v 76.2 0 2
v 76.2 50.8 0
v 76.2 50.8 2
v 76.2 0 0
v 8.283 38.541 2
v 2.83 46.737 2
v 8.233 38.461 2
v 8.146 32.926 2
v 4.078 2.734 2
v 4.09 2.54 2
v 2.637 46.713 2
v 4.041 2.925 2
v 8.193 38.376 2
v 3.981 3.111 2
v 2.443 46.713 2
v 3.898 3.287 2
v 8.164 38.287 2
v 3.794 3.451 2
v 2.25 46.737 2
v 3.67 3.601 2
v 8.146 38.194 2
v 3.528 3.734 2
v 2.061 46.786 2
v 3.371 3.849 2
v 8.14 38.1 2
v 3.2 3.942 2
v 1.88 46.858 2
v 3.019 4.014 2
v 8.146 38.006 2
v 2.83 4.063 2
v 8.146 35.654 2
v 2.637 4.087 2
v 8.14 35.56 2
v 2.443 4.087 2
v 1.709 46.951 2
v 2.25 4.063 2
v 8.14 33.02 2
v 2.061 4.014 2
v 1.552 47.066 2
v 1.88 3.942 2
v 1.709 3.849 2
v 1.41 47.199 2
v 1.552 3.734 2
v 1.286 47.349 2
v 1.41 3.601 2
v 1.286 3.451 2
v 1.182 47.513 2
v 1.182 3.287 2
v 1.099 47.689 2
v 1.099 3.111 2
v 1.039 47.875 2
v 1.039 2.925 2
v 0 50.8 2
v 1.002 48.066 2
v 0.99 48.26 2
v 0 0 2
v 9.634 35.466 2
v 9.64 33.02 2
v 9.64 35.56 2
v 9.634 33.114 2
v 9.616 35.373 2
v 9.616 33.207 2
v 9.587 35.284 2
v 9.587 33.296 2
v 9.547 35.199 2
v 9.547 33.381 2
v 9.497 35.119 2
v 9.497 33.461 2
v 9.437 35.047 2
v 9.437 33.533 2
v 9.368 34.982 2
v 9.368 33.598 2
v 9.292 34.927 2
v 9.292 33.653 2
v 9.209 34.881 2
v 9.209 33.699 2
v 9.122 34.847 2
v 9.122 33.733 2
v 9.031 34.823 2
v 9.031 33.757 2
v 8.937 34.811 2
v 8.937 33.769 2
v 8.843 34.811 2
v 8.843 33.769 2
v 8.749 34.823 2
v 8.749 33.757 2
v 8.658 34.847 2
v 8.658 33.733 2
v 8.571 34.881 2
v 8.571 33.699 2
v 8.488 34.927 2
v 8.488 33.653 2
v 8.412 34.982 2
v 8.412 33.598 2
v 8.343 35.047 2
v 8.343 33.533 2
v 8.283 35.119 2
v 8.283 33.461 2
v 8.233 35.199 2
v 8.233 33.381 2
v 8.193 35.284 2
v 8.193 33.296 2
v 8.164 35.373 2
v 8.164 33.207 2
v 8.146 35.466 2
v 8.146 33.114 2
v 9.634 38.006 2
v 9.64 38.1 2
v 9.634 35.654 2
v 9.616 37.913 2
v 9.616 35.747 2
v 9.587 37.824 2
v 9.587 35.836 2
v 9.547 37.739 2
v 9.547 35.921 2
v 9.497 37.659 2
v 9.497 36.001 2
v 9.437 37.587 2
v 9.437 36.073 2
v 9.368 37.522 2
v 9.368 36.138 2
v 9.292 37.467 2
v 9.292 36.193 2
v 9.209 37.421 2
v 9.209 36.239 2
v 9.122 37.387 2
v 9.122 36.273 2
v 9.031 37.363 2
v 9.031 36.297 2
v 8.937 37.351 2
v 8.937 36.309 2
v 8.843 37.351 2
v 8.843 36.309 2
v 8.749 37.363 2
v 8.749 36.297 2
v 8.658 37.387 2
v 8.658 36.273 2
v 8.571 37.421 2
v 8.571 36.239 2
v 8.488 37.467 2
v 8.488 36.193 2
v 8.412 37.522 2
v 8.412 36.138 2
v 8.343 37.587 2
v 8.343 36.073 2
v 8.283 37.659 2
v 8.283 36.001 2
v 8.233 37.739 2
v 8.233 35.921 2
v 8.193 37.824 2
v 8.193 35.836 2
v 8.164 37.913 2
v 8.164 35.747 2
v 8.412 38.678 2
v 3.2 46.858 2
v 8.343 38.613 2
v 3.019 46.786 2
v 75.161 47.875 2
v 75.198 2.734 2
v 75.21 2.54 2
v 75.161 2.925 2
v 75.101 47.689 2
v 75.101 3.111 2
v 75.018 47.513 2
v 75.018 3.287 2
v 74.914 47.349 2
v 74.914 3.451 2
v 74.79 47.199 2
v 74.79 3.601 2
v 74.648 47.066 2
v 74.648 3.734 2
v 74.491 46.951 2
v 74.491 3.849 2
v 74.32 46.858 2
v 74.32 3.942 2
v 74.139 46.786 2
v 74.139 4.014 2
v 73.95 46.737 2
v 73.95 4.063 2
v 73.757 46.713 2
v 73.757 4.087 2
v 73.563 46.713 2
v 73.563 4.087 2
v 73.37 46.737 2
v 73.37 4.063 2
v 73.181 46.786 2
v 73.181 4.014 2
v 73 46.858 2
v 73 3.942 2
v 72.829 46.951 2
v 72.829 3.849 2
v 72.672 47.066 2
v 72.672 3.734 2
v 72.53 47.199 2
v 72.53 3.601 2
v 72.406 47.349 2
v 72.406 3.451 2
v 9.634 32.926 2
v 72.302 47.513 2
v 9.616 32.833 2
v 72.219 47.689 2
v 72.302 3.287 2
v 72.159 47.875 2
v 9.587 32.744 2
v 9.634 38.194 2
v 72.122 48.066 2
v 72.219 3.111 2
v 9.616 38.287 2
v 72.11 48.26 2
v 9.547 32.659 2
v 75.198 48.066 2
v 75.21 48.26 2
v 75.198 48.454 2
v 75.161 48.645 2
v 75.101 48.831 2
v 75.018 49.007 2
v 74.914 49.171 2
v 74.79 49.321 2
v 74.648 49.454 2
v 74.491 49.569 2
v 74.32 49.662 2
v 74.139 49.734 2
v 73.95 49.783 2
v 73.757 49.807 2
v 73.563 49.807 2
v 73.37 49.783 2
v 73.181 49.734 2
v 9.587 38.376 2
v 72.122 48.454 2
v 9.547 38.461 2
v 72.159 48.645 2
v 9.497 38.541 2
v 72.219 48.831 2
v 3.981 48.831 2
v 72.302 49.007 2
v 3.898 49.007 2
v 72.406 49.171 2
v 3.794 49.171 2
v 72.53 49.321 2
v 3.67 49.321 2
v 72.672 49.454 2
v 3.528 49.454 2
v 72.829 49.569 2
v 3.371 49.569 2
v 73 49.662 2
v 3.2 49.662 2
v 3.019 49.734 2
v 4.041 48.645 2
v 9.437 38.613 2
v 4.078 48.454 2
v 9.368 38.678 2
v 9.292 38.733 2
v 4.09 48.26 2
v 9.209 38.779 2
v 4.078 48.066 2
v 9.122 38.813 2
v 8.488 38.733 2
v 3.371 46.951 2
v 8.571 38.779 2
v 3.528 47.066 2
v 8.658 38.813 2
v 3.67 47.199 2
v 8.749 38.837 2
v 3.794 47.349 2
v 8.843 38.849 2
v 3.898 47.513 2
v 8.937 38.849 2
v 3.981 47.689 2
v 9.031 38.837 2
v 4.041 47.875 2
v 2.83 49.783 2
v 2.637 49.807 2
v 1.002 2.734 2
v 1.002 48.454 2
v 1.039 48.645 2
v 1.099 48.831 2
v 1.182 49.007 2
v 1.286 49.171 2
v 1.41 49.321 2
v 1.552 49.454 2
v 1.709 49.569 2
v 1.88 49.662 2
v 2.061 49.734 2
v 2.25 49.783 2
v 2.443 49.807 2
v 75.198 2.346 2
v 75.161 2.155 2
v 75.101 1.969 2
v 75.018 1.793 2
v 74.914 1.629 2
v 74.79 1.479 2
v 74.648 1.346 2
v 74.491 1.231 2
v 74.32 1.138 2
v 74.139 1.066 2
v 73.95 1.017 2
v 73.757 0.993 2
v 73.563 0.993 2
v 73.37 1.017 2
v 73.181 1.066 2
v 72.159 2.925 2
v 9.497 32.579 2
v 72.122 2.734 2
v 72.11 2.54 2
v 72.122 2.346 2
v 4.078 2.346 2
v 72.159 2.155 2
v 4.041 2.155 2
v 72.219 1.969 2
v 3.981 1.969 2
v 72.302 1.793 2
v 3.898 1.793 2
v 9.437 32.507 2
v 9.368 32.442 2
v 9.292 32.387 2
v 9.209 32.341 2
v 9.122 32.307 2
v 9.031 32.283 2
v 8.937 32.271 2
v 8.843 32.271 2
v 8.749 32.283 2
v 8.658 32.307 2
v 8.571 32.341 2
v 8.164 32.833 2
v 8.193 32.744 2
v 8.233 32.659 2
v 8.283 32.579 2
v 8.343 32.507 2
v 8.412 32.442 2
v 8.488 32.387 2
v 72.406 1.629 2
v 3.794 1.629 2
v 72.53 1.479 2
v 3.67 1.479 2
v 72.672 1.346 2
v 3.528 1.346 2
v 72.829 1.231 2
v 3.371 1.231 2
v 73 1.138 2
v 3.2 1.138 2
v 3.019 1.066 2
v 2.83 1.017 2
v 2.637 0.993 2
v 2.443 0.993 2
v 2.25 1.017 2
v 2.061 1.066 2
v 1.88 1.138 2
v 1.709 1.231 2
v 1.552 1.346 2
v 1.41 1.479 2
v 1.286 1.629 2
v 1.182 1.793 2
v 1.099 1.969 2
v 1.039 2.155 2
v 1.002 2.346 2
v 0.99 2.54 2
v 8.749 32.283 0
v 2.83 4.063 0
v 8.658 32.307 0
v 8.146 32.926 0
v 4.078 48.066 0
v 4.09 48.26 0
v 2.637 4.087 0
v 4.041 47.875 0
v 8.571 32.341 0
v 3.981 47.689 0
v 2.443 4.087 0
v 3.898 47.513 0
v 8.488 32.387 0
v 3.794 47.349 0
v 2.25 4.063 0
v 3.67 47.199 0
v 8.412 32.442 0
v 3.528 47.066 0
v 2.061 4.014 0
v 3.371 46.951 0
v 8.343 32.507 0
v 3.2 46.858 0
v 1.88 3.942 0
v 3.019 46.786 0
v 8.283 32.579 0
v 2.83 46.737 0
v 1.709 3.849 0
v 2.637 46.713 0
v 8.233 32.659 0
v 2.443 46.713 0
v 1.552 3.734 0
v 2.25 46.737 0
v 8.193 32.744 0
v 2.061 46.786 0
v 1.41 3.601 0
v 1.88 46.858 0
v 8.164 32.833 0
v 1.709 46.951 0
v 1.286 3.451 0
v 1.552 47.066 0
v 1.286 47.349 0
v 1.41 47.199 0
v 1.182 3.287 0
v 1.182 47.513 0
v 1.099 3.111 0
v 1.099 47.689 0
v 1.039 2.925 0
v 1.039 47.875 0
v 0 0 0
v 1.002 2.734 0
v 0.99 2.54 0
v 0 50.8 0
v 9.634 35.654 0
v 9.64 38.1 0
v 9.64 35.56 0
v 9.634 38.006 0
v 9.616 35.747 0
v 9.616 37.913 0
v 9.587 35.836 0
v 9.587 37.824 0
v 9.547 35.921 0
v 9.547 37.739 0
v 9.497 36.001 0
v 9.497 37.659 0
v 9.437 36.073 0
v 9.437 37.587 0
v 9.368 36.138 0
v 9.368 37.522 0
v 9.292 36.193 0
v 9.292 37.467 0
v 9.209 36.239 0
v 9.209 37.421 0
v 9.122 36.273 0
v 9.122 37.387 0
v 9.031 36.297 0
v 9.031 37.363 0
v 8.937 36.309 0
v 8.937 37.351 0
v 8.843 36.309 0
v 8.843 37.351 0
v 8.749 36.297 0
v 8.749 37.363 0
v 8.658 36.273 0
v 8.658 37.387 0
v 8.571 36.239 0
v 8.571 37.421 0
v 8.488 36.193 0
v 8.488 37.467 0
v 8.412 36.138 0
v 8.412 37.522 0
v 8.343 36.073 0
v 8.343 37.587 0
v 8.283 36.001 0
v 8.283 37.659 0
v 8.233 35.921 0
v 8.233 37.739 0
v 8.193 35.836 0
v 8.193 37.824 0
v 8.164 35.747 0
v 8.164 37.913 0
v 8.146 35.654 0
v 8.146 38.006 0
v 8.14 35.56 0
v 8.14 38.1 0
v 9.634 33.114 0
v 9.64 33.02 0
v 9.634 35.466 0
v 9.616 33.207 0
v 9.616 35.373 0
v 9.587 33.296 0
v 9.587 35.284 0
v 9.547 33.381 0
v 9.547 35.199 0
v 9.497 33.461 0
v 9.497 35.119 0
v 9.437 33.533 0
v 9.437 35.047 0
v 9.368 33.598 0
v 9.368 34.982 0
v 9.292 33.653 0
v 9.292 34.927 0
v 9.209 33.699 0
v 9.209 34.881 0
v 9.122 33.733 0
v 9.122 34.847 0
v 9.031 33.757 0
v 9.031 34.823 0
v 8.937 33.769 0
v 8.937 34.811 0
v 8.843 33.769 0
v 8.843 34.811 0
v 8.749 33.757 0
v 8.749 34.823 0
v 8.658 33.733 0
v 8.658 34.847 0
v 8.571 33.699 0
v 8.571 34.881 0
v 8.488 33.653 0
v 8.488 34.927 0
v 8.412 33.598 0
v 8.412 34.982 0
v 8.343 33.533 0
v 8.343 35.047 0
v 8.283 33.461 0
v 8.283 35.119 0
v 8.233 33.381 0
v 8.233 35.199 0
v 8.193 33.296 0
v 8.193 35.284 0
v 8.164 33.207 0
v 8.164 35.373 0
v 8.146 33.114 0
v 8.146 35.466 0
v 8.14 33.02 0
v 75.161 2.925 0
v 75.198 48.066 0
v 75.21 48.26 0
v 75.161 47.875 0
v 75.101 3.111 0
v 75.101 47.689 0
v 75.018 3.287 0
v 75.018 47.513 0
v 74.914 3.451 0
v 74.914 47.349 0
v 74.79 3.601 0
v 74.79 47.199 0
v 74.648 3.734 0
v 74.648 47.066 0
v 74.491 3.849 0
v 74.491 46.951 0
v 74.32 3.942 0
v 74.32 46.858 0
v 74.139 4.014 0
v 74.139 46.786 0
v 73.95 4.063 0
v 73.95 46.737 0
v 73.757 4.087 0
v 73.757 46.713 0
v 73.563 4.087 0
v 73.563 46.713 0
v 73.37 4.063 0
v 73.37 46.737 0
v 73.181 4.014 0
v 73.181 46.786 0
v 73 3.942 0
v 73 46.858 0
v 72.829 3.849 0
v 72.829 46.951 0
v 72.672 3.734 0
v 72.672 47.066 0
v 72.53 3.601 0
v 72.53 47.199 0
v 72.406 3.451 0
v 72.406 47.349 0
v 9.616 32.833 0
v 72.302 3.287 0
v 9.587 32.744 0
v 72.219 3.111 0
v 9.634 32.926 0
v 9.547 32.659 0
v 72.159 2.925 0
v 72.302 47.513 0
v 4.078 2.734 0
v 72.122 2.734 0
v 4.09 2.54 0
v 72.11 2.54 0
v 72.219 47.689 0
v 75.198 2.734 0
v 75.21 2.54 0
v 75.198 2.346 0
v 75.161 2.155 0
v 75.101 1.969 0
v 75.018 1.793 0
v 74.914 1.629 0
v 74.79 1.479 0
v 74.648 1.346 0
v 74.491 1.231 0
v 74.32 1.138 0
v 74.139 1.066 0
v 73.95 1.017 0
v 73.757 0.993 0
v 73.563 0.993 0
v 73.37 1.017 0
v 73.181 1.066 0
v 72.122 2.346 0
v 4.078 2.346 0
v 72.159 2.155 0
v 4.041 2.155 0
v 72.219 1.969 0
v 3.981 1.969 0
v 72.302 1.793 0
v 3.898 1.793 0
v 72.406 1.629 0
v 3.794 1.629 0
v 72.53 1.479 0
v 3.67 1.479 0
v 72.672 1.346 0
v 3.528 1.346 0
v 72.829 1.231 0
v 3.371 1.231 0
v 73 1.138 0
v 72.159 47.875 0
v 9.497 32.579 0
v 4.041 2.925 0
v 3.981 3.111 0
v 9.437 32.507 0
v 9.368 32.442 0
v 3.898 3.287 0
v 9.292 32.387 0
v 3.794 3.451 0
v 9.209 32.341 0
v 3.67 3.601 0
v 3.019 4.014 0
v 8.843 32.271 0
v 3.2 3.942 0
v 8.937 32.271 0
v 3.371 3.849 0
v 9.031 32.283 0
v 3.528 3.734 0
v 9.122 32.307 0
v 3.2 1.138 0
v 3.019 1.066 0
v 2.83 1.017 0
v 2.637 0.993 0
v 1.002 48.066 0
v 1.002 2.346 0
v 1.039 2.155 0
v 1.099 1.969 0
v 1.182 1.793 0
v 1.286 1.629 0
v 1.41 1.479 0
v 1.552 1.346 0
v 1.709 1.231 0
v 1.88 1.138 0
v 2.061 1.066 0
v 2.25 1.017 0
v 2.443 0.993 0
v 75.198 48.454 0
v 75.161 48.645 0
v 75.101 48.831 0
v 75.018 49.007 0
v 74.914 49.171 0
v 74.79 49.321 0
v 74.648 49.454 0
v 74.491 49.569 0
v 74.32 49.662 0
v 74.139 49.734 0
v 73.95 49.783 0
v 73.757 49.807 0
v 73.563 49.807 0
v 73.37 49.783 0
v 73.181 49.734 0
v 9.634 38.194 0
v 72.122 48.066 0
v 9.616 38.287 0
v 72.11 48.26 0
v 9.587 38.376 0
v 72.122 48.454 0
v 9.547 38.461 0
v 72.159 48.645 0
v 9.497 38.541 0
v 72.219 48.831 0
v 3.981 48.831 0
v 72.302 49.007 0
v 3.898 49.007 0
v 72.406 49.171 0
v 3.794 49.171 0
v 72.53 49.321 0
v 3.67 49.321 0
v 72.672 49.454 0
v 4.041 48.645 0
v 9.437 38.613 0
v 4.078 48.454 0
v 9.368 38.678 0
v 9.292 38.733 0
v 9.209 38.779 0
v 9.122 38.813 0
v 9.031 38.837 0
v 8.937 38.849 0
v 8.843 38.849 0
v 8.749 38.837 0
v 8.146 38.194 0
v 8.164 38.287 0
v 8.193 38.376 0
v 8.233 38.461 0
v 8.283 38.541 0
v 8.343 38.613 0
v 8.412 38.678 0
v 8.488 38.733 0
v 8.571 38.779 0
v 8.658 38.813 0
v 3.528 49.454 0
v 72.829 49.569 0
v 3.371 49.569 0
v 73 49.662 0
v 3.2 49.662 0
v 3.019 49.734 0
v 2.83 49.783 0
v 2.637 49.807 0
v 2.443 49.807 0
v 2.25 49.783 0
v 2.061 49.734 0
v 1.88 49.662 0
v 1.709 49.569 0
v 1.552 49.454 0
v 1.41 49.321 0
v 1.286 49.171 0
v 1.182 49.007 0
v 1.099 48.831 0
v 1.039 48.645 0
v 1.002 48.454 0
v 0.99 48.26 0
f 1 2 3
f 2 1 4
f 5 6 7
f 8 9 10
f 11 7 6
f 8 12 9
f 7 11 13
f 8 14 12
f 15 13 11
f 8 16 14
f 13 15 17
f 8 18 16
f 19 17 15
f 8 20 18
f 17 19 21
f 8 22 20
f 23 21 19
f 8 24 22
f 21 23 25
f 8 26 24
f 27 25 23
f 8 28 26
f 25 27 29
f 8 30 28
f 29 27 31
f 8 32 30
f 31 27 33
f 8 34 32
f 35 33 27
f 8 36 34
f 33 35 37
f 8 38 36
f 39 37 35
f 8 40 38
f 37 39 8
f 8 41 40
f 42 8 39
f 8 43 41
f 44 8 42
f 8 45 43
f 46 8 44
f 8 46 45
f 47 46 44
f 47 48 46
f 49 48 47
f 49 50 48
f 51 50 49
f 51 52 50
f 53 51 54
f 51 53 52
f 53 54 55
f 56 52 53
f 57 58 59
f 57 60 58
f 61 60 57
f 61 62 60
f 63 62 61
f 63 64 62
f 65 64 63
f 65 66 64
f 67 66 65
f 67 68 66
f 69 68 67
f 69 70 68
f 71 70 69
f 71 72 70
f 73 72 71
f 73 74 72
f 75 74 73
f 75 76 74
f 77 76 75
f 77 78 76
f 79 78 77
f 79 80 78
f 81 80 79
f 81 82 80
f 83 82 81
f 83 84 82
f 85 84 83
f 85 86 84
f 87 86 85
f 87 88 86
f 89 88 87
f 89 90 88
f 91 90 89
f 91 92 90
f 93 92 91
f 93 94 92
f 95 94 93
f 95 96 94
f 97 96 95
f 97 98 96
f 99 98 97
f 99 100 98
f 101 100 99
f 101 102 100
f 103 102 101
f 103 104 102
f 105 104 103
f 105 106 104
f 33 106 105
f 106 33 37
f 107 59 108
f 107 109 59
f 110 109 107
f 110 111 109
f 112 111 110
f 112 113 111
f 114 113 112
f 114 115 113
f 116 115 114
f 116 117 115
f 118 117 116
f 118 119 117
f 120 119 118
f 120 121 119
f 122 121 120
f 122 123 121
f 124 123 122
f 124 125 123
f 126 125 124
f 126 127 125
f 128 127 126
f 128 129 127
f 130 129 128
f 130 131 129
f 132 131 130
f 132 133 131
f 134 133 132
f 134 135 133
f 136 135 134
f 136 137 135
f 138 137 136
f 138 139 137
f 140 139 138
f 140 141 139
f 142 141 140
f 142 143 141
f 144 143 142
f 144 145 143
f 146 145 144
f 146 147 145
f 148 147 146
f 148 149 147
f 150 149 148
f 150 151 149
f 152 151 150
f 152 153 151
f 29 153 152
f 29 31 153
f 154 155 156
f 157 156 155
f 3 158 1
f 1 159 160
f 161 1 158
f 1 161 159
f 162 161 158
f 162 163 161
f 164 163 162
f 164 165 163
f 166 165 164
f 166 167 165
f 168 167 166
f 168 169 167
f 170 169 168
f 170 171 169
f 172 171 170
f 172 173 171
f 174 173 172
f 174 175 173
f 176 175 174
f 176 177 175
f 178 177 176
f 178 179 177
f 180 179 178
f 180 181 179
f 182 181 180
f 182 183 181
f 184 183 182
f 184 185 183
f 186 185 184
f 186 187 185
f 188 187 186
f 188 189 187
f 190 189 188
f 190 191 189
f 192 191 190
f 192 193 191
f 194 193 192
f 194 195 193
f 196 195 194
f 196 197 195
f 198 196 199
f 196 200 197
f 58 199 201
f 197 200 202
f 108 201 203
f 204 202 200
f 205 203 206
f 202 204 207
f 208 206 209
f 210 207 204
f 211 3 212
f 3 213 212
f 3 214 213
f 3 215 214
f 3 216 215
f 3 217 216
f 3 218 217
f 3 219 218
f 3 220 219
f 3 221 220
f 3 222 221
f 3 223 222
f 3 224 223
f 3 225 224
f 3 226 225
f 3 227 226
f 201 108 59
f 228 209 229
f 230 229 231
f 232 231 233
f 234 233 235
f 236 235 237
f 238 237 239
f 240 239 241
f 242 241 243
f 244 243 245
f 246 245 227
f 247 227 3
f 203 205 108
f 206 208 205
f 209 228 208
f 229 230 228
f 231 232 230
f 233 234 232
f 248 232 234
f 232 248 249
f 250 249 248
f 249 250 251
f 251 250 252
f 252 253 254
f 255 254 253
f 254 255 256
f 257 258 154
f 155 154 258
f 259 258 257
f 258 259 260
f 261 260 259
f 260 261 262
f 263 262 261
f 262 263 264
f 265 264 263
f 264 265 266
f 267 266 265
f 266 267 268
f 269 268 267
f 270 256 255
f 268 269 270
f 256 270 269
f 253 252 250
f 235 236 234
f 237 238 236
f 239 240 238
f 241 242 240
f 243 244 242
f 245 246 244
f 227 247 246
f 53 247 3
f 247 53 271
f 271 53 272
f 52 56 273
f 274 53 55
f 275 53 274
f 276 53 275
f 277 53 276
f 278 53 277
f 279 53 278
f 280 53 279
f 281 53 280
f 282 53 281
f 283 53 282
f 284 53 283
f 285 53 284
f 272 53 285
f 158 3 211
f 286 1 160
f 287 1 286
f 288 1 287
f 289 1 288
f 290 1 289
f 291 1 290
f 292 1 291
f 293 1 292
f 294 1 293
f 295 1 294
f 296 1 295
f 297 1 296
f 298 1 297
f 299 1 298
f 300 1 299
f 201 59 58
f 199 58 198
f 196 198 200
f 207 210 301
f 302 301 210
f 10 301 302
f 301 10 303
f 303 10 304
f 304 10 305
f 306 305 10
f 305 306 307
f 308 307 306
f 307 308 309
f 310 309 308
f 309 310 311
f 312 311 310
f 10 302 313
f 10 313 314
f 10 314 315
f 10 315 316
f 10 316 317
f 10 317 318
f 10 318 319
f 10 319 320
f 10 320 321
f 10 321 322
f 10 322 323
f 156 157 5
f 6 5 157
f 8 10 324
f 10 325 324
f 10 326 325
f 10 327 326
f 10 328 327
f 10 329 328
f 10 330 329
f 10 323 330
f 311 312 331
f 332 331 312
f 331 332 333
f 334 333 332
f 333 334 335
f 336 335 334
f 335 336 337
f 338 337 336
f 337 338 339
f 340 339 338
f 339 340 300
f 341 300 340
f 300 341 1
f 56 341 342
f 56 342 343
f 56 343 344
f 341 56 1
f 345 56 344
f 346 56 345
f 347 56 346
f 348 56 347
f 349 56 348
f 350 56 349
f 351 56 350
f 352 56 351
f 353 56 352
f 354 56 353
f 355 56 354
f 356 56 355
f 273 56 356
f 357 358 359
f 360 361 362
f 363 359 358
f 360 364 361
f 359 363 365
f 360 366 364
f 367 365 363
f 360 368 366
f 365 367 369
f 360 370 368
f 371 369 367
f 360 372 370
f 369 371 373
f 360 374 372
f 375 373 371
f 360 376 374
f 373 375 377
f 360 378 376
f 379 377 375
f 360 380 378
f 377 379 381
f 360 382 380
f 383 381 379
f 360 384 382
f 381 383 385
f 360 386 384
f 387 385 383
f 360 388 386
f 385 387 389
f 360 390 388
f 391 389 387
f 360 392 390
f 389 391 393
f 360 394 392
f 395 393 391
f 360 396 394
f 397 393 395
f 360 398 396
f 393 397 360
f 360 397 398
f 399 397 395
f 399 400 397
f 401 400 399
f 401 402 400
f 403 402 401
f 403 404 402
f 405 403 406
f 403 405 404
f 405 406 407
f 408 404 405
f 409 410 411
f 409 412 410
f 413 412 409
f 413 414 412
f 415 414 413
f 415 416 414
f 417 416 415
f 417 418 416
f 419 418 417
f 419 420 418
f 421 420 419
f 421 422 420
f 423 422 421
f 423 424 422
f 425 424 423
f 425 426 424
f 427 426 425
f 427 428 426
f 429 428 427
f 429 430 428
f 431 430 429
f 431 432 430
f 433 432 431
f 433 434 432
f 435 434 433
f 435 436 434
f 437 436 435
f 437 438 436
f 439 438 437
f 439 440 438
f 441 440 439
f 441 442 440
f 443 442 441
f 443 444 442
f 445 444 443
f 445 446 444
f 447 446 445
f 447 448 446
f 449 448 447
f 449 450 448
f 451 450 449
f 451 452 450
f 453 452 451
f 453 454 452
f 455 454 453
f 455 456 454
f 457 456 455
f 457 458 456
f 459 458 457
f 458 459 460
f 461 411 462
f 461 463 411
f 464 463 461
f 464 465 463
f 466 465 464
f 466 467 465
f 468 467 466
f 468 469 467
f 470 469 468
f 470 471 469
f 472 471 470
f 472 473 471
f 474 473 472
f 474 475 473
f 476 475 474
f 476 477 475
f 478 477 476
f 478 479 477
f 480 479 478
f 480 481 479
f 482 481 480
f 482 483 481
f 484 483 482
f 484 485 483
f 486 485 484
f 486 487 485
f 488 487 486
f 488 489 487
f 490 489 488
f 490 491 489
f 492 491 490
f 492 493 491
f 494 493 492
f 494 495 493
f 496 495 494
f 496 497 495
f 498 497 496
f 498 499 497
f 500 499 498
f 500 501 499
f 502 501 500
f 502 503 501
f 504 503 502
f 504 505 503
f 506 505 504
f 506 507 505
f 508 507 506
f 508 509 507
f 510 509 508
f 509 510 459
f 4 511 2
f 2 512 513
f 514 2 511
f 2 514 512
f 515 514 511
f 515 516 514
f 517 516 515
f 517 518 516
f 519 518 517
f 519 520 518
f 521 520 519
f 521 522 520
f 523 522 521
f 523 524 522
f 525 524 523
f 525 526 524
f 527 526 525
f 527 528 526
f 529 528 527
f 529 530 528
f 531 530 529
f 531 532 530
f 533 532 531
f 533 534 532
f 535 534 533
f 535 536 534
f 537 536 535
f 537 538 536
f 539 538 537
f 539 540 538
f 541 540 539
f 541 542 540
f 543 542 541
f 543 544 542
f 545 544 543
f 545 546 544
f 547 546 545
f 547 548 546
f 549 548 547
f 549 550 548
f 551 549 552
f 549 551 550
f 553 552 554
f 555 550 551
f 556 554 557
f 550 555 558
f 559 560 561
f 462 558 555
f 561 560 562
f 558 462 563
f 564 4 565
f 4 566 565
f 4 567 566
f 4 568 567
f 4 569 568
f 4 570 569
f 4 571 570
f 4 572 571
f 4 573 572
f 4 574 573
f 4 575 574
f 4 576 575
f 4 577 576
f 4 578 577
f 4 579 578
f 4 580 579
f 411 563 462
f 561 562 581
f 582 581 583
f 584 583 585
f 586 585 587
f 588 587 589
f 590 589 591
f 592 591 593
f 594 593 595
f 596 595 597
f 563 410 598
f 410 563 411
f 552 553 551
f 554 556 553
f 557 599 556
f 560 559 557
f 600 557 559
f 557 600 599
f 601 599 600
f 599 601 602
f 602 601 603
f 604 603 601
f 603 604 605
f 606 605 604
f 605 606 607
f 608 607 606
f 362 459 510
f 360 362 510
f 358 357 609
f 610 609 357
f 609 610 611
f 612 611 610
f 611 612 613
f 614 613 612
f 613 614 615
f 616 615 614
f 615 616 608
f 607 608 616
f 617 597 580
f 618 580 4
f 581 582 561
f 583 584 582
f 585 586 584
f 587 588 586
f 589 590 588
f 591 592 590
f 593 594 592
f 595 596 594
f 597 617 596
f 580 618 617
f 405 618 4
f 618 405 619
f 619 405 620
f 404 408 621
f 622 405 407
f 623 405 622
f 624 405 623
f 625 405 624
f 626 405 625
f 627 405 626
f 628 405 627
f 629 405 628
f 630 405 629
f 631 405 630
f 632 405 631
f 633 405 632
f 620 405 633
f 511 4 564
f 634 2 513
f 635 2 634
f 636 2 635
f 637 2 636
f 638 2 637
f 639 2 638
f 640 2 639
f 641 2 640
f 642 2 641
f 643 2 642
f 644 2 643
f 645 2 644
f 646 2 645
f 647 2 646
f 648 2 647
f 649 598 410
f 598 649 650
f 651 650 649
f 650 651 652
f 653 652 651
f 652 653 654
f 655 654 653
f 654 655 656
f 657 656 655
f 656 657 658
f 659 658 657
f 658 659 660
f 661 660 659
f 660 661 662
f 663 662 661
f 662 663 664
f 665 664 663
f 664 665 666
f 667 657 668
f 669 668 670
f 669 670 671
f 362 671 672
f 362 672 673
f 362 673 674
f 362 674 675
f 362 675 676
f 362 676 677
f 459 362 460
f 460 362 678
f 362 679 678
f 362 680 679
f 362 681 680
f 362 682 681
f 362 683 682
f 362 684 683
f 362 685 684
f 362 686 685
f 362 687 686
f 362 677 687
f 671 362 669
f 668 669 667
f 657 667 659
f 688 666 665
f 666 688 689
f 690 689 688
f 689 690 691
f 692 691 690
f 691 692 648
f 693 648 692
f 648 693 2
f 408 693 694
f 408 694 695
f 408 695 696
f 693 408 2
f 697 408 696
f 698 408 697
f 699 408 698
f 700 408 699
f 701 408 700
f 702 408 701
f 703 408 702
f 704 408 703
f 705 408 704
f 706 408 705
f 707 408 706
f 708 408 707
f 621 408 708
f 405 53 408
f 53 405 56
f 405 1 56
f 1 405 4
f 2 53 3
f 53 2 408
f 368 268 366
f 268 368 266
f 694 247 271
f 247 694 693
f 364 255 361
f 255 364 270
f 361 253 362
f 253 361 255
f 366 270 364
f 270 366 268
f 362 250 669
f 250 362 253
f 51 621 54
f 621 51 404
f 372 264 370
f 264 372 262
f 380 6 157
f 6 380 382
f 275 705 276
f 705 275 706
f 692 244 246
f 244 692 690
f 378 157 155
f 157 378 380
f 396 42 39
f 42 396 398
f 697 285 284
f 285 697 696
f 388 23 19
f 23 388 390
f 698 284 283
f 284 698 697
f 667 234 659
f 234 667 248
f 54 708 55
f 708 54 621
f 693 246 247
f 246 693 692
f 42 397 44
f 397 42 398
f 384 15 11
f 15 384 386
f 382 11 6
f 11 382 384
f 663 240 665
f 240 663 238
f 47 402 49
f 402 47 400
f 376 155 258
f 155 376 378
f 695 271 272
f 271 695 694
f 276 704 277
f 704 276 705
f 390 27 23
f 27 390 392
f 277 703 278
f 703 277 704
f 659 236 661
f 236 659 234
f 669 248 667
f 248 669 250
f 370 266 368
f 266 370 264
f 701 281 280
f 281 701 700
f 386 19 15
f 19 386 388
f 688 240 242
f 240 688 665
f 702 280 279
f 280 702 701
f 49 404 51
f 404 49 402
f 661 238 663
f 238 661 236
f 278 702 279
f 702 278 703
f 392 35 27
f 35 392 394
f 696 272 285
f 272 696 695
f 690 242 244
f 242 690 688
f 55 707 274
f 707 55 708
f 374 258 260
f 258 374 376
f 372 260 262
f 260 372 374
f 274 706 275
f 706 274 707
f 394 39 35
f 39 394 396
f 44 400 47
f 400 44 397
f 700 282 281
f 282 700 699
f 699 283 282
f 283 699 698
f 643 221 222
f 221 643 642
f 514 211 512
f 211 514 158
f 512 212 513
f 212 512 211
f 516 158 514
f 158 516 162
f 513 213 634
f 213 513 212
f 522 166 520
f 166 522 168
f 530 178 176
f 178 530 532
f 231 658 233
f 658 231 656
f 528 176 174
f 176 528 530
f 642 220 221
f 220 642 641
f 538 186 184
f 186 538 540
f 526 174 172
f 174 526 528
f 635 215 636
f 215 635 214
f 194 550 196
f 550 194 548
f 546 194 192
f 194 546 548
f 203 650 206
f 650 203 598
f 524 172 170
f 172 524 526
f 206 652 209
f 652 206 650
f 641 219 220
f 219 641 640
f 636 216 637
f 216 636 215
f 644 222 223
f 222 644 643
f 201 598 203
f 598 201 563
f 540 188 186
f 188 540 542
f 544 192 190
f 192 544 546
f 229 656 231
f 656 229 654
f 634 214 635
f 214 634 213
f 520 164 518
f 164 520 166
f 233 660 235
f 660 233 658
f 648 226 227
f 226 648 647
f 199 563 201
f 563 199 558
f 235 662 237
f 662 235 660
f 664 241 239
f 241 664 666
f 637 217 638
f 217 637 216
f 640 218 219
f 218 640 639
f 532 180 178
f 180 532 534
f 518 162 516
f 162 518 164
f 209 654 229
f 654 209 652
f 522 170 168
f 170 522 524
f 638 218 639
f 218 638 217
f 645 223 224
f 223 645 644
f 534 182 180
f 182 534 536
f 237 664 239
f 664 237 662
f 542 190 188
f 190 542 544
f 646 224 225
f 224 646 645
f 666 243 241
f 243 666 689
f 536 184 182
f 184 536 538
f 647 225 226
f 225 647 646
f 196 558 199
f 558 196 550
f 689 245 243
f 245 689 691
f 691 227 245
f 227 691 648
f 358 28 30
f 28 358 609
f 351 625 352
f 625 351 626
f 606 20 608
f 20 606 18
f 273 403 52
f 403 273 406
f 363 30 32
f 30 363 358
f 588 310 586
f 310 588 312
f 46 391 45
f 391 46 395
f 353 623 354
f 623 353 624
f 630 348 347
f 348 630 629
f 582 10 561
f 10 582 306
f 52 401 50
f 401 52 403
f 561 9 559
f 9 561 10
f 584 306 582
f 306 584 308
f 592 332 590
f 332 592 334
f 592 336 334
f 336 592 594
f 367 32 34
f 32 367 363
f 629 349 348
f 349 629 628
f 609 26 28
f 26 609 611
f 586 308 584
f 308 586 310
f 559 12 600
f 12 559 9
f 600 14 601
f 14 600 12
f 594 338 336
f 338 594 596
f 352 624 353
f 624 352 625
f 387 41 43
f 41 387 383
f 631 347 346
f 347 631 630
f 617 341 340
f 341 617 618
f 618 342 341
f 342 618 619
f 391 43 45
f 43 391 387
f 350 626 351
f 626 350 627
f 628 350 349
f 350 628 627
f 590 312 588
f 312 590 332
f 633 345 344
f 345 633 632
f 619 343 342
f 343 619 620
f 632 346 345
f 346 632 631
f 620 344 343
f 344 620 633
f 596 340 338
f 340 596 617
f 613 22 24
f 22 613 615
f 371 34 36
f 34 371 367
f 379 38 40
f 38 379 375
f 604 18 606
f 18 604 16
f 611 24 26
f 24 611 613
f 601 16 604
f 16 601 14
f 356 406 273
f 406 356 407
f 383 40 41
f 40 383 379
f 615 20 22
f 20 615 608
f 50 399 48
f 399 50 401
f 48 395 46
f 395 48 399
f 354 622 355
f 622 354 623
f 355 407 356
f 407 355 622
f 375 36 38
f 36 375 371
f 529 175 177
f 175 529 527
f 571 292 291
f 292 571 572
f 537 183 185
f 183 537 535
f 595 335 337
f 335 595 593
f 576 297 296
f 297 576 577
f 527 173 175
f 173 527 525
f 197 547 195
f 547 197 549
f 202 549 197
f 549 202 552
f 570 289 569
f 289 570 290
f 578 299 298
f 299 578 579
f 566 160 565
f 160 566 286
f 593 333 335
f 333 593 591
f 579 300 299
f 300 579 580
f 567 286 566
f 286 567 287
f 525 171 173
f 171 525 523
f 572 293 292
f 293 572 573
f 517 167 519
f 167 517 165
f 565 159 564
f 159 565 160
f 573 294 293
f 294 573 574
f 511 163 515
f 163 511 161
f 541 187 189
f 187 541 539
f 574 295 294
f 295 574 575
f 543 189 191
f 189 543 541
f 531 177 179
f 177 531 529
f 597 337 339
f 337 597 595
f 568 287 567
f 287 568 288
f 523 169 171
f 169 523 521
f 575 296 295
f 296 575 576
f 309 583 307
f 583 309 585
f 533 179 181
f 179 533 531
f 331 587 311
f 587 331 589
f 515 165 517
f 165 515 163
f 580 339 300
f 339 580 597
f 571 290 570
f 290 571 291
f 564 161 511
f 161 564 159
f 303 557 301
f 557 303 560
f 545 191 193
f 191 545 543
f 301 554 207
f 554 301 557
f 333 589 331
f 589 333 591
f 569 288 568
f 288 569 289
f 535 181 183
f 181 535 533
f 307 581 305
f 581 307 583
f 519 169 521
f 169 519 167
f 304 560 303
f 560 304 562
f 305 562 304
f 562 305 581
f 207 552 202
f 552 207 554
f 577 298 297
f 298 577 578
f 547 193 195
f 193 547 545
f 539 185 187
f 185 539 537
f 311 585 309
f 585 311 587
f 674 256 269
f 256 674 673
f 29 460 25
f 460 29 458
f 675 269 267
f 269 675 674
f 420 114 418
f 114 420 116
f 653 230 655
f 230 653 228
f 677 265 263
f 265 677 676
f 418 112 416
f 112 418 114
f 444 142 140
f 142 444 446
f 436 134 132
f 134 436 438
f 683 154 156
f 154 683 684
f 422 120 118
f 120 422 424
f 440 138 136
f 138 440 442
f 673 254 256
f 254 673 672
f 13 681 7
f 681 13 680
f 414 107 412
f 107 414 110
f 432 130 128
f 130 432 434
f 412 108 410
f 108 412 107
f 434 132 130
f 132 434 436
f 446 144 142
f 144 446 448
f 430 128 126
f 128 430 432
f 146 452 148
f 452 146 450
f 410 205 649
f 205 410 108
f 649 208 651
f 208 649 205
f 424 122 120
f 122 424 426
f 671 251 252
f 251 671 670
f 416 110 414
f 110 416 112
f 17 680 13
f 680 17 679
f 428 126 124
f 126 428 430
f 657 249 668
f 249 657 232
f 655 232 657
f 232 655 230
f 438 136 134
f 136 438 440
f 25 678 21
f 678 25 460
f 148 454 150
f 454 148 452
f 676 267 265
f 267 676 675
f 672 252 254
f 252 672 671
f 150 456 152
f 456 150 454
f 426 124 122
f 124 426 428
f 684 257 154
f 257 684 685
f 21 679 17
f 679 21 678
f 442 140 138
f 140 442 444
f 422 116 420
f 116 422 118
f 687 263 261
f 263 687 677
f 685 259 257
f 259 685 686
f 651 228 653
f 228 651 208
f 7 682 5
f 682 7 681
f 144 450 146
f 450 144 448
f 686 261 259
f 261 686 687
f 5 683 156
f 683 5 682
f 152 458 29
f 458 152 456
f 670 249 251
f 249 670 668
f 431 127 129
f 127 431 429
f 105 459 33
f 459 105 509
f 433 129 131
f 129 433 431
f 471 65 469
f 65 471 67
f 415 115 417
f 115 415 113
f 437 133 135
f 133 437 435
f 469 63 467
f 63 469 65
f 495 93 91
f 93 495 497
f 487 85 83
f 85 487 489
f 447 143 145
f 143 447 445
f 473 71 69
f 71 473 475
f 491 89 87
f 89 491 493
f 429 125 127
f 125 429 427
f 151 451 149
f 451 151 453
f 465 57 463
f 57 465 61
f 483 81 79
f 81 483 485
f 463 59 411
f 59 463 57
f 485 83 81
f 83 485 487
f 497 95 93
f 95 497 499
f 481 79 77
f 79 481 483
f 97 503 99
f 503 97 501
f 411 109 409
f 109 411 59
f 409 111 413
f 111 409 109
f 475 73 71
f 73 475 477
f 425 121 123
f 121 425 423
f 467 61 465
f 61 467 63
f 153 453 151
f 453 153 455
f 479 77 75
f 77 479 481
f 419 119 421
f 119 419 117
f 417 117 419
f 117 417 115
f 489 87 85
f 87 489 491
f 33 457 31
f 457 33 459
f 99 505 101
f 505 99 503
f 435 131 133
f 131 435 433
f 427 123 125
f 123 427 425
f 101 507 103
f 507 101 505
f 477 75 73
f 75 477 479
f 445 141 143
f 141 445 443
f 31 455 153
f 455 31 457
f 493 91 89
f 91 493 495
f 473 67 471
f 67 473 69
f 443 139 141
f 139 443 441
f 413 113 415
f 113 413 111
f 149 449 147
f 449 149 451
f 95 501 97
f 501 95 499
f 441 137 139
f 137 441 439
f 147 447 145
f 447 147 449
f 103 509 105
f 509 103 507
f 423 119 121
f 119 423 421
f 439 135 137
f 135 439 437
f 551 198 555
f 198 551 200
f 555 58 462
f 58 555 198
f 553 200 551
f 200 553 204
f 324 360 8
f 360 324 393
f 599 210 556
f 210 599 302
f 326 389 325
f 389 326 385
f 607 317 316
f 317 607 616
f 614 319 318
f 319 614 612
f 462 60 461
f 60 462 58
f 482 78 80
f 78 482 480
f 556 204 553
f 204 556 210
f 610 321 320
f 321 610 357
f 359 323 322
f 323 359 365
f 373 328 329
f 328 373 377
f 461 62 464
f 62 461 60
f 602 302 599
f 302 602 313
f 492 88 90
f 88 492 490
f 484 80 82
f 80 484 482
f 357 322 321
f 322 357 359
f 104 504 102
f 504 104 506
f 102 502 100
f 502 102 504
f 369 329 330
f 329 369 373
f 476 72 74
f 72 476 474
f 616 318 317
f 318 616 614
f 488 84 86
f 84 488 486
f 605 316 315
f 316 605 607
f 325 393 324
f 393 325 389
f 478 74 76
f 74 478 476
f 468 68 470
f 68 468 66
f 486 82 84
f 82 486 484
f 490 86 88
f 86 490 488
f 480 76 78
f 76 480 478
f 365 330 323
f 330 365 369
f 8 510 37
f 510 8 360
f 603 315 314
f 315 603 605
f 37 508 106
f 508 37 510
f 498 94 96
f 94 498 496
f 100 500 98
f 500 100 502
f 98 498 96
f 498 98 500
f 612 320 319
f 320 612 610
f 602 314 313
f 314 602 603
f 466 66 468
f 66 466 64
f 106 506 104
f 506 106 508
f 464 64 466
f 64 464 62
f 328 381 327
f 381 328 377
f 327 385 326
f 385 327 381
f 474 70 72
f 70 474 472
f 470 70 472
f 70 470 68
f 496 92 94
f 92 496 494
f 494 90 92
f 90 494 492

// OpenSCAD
$fn=50;
translate([0,50.8,0]) mirror([0,1,0]) difference()
{
    cube([76.2,50.8,2]);
    translate([2.54,2.54,-0.1]) cylinder(h=10,d=3.1);
    translate([73.659996,2.54,-0.1]) cylinder(h=10,d=3.1);
    translate([2.54,48.26,-0.1]) cylinder(h=10,d=3.1);
    translate([73.659996,48.26,-0.1]) cylinder(h=10,d=3.1);
    translate([8.889999,12.7,-0.1]) cylinder(h=10,d=1.5);
    translate([8.889999,15.24,-0.1]) cylinder(h=10,d=1.5);
    translate([8.889999,17.779999,-0.1]) cylinder(h=10,d=1.5);
}
